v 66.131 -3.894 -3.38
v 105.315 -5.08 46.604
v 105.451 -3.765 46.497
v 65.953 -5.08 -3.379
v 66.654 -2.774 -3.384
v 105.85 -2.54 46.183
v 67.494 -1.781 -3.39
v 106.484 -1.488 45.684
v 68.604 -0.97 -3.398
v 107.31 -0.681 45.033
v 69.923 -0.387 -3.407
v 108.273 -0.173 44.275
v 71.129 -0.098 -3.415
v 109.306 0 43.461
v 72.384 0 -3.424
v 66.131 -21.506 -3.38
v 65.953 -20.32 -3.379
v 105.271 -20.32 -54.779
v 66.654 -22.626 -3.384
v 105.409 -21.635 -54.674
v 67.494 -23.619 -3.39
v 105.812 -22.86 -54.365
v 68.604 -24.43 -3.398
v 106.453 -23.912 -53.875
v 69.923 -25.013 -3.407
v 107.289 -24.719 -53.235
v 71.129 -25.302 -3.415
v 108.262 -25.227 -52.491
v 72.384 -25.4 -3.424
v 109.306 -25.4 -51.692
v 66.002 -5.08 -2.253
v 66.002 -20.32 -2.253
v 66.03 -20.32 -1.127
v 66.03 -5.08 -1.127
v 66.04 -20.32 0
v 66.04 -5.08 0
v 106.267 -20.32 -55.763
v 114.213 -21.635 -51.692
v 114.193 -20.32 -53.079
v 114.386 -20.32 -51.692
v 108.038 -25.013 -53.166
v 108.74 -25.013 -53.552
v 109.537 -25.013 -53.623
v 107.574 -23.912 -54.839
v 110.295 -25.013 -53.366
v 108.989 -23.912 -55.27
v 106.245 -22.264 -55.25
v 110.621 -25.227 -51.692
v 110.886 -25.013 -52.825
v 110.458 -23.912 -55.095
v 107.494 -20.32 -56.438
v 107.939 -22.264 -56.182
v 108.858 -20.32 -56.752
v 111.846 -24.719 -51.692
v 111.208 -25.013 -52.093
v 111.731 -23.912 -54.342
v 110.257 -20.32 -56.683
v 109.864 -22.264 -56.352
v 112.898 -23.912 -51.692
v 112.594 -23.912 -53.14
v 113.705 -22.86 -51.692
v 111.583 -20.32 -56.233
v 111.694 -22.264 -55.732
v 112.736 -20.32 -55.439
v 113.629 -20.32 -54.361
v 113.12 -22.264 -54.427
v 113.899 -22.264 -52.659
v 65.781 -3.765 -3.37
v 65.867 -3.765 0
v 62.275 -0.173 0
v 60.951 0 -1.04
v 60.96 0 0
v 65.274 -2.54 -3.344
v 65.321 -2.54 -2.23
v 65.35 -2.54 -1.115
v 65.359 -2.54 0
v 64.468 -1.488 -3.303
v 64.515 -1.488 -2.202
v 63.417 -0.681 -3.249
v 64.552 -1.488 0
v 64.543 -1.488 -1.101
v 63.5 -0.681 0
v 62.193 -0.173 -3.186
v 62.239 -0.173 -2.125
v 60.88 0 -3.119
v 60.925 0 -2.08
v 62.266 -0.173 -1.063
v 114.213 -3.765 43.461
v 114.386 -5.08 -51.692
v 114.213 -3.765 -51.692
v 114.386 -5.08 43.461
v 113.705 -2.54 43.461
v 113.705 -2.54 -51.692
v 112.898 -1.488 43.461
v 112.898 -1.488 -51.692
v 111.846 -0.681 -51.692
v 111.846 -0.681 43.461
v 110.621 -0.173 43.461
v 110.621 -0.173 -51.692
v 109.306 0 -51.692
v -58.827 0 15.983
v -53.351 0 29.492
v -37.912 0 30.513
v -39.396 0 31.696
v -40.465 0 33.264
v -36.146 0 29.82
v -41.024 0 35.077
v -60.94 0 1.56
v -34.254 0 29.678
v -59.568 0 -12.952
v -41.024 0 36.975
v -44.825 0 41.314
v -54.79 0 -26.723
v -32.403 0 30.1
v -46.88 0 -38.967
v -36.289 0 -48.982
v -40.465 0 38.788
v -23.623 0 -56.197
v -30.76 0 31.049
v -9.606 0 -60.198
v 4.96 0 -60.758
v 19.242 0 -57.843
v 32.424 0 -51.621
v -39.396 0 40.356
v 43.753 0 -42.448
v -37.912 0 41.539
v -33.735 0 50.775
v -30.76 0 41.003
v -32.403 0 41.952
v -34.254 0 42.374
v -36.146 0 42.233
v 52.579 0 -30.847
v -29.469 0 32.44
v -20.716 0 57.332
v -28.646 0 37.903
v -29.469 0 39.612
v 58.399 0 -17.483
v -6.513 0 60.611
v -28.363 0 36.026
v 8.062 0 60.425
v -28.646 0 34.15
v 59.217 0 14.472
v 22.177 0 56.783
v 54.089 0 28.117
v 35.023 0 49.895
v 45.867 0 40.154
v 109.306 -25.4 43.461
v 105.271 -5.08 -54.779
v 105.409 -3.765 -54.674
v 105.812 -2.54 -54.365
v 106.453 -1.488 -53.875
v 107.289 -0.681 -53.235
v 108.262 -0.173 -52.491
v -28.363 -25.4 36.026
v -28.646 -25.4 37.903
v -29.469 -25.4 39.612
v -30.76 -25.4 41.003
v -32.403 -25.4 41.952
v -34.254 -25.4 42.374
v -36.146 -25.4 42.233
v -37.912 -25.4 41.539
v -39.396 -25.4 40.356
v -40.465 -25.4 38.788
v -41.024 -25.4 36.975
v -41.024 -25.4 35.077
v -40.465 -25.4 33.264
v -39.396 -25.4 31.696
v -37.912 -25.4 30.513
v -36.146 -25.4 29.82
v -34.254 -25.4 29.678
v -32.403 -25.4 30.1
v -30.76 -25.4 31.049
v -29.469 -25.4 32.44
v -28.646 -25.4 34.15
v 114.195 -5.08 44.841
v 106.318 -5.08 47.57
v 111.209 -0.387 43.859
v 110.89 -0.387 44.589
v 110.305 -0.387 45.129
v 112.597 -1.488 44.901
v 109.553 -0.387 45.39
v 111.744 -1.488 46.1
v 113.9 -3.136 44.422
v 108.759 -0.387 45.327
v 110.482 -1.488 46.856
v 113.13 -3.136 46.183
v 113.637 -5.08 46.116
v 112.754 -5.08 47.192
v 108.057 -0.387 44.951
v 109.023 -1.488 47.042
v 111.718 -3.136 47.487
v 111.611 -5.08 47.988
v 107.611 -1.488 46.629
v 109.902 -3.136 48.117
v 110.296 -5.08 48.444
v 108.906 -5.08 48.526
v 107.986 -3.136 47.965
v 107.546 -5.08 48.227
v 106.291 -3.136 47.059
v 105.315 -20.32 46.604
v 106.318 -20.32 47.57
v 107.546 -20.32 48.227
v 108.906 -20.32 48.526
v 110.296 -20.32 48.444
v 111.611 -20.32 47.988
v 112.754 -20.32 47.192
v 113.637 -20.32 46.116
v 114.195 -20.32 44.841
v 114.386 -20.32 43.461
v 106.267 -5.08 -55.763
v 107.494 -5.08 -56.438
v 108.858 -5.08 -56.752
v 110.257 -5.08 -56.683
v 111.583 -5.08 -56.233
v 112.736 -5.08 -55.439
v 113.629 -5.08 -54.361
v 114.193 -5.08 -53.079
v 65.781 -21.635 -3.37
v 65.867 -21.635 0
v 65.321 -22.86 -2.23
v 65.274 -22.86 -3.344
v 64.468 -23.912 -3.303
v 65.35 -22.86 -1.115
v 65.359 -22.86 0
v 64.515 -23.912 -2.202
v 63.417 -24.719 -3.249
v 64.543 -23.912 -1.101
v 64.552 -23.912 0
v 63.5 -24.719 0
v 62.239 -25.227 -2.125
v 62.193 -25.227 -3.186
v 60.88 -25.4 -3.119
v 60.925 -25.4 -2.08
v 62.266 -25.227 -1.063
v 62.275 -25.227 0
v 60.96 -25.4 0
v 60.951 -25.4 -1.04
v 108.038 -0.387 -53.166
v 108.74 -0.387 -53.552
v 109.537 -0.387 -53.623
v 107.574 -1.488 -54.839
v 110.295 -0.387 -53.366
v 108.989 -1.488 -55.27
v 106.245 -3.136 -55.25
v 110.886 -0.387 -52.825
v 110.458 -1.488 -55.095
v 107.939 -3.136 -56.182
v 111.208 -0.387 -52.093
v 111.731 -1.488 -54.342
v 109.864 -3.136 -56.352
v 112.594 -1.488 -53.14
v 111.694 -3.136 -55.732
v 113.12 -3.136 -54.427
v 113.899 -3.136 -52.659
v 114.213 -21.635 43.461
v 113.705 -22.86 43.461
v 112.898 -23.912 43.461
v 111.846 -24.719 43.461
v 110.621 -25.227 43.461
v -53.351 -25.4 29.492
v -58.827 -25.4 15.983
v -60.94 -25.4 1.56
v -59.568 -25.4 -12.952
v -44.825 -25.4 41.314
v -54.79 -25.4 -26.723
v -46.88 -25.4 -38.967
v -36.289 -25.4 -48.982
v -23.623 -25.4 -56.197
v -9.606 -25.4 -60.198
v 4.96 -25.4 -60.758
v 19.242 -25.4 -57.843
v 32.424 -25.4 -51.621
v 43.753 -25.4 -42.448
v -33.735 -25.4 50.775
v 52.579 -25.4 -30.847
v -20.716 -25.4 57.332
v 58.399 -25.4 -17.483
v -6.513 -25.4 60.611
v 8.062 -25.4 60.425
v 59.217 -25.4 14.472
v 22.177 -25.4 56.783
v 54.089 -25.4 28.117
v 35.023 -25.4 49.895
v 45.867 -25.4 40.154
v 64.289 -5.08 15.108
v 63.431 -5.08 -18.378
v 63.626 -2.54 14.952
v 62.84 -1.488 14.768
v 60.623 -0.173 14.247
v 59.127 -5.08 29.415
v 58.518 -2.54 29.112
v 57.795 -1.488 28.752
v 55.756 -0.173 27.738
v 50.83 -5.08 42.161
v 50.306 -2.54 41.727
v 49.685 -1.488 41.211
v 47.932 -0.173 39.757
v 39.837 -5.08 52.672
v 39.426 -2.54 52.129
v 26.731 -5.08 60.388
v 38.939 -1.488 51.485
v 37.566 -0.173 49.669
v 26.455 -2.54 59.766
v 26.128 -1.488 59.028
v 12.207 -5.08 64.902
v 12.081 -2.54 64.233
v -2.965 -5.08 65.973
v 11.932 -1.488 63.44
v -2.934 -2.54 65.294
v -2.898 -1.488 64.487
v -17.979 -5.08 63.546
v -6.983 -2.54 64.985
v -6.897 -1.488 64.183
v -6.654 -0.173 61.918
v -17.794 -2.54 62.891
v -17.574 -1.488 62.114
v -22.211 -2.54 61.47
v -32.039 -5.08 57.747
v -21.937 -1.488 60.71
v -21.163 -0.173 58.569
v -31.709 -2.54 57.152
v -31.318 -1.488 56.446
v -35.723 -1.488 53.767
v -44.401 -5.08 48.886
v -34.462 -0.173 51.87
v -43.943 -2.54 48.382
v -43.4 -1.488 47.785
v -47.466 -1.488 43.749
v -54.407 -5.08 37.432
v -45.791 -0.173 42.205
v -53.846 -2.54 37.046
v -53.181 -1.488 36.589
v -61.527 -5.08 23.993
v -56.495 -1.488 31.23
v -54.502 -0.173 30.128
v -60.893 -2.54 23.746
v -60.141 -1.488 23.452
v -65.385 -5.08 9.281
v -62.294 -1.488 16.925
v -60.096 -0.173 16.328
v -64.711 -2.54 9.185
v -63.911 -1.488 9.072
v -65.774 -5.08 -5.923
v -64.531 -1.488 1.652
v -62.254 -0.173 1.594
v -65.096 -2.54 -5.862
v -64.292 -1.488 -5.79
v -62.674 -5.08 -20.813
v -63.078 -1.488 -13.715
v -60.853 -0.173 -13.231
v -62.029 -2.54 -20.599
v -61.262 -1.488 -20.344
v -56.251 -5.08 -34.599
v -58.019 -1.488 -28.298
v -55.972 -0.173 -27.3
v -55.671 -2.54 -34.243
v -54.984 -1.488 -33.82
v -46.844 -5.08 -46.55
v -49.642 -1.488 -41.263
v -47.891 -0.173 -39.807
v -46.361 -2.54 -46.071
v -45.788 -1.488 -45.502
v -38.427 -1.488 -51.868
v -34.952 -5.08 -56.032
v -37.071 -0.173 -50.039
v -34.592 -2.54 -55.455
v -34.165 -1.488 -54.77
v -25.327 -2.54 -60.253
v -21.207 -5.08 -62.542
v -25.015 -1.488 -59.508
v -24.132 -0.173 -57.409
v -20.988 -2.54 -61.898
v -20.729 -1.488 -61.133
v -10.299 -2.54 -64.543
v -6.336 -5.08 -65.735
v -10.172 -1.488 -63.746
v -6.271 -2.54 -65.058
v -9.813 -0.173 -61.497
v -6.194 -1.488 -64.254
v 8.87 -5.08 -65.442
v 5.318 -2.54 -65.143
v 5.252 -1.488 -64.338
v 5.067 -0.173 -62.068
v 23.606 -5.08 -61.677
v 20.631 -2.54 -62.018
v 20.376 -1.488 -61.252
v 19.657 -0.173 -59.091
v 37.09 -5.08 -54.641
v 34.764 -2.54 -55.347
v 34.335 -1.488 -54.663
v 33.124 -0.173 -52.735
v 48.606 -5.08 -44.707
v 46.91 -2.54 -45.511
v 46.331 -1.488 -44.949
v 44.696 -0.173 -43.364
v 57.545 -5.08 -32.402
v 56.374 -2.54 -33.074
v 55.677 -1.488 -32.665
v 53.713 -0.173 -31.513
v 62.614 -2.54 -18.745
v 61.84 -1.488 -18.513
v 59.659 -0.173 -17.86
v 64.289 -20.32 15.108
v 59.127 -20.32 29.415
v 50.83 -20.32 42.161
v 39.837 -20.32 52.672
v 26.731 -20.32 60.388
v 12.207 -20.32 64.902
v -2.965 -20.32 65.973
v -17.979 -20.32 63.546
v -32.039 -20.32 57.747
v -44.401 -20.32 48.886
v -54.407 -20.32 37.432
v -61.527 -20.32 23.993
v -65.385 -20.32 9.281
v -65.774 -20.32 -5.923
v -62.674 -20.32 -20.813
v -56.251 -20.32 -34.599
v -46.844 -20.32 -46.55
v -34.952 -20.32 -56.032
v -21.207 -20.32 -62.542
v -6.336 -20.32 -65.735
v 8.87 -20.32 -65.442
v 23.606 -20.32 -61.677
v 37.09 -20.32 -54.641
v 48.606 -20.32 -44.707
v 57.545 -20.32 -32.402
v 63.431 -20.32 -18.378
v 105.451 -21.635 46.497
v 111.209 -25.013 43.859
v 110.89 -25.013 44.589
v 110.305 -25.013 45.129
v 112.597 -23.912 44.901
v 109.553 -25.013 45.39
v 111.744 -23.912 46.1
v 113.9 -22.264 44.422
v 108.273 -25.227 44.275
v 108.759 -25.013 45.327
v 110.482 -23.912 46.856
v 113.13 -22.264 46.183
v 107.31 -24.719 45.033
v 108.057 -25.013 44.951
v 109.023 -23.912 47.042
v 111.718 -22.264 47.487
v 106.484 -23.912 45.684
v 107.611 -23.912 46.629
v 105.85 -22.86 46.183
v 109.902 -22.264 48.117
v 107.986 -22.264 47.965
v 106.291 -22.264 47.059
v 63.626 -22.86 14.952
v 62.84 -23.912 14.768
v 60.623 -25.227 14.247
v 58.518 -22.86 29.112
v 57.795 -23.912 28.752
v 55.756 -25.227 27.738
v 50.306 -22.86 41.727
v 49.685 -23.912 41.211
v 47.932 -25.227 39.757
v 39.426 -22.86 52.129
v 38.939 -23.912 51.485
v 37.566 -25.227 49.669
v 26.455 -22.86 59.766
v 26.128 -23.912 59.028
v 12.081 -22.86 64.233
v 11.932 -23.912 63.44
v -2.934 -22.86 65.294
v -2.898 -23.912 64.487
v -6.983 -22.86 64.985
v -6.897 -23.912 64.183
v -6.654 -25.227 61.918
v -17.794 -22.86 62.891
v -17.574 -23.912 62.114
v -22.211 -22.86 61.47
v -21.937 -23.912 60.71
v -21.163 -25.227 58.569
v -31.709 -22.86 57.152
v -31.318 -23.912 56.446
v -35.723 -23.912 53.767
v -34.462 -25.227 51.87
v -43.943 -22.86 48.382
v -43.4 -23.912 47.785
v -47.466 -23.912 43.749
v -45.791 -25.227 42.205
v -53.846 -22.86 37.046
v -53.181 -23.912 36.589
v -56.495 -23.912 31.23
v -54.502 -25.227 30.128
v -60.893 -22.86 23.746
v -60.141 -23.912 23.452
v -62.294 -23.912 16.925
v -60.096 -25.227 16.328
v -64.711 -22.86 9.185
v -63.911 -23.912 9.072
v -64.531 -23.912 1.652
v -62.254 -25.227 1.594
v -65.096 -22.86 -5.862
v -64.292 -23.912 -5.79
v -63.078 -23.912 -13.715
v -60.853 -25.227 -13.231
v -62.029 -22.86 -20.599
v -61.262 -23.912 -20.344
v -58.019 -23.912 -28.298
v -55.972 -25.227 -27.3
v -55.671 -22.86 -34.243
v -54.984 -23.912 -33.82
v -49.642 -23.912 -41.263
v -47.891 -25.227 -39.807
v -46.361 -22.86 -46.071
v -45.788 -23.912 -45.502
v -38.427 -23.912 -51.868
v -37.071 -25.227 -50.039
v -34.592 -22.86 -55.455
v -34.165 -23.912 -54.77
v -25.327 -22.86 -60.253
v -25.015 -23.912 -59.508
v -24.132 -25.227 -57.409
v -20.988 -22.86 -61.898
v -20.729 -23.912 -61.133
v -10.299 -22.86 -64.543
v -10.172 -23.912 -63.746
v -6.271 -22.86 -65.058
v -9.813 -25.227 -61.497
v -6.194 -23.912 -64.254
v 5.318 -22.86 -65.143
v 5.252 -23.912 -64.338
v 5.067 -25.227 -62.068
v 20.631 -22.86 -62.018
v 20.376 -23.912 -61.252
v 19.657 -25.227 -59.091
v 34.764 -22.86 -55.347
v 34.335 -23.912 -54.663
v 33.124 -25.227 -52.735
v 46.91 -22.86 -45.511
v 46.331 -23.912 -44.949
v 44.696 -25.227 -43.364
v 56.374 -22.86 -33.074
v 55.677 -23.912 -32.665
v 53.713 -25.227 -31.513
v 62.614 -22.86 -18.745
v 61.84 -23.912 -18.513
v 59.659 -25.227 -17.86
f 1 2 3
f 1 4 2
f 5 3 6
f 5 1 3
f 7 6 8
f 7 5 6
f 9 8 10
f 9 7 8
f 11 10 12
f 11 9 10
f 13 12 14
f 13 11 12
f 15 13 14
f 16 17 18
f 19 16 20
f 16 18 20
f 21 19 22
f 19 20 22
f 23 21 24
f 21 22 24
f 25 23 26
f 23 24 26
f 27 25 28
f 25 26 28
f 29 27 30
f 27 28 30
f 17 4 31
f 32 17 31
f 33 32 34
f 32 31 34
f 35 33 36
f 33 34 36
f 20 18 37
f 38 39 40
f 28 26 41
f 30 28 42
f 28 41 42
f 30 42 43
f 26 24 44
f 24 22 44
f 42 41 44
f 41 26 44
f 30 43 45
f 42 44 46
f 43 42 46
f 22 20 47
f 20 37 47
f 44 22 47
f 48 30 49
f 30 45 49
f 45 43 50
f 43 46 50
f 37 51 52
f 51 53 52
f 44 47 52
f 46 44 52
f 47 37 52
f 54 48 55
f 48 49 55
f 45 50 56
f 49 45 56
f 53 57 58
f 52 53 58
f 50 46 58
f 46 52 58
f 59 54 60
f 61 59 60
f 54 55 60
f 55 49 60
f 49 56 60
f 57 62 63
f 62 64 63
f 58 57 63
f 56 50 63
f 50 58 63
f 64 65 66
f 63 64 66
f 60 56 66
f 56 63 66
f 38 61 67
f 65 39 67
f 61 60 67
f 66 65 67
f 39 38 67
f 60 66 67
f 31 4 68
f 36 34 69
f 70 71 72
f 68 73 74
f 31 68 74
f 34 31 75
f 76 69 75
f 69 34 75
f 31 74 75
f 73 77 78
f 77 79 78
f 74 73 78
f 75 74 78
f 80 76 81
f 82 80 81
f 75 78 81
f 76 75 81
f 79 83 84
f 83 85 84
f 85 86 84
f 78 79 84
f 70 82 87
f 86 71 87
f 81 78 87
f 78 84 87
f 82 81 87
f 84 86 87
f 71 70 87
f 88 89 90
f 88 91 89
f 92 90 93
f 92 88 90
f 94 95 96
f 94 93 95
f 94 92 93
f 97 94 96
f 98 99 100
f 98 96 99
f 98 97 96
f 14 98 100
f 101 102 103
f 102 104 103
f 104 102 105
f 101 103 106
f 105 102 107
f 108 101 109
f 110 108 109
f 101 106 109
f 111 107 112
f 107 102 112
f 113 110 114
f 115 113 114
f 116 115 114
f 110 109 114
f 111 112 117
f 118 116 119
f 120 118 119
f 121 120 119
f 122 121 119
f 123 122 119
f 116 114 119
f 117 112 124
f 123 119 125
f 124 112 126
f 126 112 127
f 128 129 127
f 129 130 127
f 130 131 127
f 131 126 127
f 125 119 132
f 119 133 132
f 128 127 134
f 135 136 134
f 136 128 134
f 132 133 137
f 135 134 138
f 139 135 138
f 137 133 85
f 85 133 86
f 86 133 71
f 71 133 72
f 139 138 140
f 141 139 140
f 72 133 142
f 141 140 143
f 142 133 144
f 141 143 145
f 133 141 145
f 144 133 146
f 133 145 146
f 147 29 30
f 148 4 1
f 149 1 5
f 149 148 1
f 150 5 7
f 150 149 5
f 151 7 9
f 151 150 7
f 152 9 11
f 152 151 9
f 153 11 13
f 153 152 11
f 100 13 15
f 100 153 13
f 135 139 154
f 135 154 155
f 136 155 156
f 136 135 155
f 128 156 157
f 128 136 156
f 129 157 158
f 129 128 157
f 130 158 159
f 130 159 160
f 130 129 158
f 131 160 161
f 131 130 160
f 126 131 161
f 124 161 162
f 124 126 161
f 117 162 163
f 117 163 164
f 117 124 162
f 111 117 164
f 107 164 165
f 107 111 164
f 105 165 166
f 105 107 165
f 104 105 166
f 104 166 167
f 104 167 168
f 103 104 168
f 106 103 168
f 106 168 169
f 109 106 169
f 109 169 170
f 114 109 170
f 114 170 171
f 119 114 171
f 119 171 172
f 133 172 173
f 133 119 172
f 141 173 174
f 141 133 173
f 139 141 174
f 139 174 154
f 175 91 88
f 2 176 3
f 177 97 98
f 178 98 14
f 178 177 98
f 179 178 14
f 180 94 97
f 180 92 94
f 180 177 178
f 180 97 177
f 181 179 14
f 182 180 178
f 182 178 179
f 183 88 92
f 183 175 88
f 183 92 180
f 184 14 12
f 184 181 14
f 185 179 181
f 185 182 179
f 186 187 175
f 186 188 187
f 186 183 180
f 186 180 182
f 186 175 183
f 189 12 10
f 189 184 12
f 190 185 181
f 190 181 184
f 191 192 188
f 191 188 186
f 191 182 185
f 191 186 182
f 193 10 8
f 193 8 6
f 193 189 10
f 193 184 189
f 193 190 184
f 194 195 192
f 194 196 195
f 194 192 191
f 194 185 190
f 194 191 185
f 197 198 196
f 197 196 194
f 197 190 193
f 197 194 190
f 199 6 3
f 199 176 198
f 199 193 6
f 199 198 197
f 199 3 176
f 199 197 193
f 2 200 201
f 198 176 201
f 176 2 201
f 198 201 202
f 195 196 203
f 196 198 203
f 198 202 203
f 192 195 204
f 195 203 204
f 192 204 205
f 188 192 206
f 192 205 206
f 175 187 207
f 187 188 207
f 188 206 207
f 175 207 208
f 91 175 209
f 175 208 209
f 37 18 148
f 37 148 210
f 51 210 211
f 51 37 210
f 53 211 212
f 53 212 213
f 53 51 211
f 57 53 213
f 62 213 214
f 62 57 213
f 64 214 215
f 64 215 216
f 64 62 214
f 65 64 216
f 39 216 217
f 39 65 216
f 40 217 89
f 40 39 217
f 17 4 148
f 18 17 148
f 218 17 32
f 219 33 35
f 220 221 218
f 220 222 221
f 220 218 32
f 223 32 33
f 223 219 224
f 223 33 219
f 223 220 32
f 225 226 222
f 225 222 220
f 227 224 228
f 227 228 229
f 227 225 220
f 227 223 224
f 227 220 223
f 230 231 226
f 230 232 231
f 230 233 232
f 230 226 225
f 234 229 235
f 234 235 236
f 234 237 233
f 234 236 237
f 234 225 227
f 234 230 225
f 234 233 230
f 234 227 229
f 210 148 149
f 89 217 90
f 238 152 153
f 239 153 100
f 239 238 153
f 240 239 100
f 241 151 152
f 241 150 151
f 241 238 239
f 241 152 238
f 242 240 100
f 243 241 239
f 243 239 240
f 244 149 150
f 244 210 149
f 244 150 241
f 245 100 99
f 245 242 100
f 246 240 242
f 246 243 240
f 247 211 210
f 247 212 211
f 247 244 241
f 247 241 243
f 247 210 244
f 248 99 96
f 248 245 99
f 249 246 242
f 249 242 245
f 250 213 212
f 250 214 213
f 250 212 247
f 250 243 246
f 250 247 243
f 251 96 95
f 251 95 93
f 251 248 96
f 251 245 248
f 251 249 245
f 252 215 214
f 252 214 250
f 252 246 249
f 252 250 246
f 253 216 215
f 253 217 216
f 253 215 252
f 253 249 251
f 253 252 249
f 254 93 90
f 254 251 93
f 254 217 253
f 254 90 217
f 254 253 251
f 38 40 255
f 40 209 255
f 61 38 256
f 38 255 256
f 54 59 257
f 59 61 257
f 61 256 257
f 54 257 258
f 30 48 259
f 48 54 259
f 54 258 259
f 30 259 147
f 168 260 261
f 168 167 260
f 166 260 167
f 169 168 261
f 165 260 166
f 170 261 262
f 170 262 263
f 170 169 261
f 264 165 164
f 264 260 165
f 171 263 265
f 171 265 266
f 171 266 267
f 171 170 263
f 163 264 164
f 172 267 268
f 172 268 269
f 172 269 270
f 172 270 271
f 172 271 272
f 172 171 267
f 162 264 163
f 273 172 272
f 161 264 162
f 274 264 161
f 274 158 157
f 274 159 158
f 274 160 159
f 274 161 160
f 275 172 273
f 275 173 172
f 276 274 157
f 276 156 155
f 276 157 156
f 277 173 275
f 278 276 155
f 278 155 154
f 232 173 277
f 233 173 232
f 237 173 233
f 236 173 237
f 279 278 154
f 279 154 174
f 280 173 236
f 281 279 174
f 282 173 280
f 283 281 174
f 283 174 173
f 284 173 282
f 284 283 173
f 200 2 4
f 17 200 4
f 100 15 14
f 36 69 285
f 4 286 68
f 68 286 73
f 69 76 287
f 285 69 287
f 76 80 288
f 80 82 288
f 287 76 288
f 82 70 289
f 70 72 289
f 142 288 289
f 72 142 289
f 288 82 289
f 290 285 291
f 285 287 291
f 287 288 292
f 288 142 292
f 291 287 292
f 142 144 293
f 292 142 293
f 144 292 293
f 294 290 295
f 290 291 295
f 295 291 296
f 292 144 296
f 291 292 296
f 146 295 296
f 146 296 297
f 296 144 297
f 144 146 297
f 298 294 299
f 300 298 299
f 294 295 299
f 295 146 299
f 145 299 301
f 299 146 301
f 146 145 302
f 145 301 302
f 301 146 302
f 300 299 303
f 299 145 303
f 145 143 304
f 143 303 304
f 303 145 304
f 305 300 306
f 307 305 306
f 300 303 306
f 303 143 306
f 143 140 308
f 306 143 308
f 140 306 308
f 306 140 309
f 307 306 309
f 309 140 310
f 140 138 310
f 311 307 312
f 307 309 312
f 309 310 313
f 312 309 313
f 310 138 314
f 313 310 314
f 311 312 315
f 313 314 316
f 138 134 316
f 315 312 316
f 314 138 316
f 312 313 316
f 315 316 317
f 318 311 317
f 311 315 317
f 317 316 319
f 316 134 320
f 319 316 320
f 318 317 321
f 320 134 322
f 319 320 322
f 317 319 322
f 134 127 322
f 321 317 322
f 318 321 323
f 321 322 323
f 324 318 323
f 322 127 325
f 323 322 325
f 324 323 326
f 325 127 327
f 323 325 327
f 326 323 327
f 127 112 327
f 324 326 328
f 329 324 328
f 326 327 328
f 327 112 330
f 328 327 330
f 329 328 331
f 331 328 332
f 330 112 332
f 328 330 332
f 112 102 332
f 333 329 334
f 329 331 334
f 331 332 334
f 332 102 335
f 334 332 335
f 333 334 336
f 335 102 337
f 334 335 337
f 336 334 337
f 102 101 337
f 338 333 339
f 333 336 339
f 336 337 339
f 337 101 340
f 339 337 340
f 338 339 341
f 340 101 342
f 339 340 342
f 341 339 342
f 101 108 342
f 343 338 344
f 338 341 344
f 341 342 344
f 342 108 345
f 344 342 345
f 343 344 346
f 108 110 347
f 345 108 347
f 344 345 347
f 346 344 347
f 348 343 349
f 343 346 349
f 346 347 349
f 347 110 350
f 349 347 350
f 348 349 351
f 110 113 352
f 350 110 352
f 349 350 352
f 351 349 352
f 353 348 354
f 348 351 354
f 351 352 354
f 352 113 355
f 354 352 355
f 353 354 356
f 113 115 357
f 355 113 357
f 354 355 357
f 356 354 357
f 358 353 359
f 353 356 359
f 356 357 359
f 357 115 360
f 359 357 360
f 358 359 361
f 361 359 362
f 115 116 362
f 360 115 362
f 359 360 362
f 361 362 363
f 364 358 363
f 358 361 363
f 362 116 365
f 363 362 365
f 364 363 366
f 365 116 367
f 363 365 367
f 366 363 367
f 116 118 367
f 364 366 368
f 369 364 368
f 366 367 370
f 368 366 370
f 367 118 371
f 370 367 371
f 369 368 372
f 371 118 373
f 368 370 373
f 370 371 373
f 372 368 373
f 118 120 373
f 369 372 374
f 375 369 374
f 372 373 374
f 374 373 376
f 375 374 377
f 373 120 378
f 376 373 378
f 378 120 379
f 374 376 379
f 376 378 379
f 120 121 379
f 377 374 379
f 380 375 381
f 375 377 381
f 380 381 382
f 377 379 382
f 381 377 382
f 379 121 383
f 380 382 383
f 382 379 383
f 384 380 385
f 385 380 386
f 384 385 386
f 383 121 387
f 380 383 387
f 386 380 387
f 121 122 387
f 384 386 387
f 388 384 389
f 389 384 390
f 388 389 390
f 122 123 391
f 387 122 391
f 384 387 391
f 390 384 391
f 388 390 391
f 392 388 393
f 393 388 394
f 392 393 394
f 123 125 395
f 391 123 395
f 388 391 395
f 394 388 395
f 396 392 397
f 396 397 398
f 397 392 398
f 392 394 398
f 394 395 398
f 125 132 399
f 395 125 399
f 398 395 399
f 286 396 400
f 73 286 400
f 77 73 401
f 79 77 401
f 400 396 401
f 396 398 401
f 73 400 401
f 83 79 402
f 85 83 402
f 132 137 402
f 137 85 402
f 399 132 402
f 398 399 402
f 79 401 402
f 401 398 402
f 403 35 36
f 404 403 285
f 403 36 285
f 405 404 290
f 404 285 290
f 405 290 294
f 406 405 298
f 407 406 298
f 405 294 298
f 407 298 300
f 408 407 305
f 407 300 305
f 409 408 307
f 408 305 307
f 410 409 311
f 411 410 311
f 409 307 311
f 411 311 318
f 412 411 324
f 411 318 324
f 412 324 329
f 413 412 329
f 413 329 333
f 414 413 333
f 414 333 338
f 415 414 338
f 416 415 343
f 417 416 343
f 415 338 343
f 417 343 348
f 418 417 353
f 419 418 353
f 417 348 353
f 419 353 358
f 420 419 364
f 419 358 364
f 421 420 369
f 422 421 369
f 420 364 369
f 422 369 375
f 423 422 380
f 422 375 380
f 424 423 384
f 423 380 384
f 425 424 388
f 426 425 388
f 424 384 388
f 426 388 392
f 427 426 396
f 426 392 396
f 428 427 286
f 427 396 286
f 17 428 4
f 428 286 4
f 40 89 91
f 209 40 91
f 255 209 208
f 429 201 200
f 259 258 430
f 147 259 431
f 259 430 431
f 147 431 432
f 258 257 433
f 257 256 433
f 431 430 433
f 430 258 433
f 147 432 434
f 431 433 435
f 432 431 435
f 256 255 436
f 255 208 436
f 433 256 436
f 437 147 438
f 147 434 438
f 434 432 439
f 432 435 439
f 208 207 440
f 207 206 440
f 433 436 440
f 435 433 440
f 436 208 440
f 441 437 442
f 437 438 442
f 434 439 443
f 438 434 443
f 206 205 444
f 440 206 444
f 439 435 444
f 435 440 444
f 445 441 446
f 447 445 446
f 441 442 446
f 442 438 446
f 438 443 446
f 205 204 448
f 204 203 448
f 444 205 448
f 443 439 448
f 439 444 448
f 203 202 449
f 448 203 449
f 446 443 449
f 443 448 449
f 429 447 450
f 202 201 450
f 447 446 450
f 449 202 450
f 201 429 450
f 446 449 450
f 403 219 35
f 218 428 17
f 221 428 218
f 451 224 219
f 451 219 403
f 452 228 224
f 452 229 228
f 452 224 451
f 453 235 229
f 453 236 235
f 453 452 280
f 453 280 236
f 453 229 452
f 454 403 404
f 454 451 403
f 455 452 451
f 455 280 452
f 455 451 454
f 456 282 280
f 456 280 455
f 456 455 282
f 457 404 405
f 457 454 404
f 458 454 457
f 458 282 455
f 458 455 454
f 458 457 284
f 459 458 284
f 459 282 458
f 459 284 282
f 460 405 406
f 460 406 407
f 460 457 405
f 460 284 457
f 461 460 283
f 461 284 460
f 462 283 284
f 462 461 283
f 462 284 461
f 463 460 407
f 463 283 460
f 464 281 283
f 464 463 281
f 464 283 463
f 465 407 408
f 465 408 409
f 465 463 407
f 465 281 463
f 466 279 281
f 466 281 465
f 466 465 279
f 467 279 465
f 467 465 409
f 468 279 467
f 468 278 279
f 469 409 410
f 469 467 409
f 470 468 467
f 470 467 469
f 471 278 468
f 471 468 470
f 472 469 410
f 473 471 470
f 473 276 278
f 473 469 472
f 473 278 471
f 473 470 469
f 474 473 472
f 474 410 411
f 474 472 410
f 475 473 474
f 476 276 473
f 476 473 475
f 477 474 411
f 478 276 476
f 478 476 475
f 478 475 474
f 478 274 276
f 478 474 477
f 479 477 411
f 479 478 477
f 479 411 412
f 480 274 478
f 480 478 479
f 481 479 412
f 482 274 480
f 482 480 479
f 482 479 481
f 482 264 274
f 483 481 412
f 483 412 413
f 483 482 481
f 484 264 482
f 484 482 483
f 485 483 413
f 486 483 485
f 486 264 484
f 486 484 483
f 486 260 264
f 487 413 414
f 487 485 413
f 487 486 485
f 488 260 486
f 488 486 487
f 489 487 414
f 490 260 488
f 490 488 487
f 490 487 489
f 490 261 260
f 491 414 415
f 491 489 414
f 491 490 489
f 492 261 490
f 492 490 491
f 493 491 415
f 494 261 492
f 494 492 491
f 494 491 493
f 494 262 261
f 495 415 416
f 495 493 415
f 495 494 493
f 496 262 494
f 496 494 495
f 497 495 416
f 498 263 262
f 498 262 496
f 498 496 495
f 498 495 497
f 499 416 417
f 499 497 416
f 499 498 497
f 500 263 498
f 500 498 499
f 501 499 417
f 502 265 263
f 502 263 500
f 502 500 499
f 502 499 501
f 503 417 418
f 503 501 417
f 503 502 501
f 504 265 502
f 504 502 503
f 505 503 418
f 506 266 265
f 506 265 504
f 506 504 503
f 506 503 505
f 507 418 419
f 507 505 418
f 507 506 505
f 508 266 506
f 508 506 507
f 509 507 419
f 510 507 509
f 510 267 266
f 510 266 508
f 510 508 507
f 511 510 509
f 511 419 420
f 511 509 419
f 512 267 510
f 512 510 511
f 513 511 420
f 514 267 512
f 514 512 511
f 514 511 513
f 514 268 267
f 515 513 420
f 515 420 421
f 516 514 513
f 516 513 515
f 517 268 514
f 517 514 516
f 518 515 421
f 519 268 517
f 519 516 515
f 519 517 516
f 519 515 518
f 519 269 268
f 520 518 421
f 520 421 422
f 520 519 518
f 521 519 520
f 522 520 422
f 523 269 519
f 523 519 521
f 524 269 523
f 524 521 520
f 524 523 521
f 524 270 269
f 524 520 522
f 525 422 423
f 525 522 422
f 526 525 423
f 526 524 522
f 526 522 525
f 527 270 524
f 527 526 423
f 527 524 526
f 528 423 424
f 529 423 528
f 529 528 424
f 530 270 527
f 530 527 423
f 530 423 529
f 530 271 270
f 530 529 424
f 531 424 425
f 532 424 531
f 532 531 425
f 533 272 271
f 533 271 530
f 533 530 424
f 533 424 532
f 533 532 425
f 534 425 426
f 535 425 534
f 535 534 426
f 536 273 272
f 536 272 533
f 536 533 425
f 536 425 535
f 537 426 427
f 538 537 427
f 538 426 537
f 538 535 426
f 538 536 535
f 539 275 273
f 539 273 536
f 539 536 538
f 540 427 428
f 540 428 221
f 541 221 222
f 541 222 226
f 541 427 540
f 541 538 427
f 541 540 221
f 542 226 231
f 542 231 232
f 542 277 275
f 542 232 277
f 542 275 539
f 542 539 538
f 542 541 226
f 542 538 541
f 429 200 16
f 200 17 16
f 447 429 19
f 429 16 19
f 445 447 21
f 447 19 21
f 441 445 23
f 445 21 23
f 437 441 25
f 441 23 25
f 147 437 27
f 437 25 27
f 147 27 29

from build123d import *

# Parameters (mm, degrees)
F1_DEPTH = 25.4
F2_R     = 5.08
F2_2_R   = 5.08
F3_R     = 6.3660759479
F4_DEPTH = 25.4


with BuildPart() as f1:
    # F0 (on Front) → F1 (new body)
    with BuildSketch(Plane.XZ):
        with BuildLine():
            ThreePointArc((65.9534972126, -3.3790243298), (66.0183707612, -1.6900656906), (66.04, 0))
            ThreePointArc((66.04, 0), (-66.0183707612, 1.6900656906), (65.9534972126, -3.3790243298))
        make_face()
    extrude(amount=F1_DEPTH)

    # F2
    f2_edges = [f1.edges().sort_by_distance(p)[0] for p in [
        (-65.953497, -25.4, 3.379024),
        (-65.953497, 0, 3.379024),
    ]]
    fillet(f2_edges, radius=F2_R)

    # F3 (on Front) → F4 (cut)
    with BuildSketch(Plane.XZ):
        with Locations((-34.7292758524, 36.0262021422)):
            Circle(F3_R)
    extrude(amount=F4_DEPTH, mode=Mode.SUBTRACT)


with BuildPart() as f1b:
    # F0 (on Front) → F1, piece 2 (new body)
    with BuildSketch(Plane.XZ):
        Polygon((114.3860071898, 58.1232085824), (65.9534972126, -3.3790243298), (114.3860071898, -66.694535315), align=None)
    extrude(amount=F1_DEPTH)

    # F2#2
    f2_2_edges = [f1b.edges().sort_by_distance(p)[0] for p in [
        (90.169752, -25.4, 27.372092),
        (114.386007, -12.7, 58.123209),
        (114.386007, 0, -4.285663),
        (114.386007, -12.7, -66.694535),
        (90.169752, -25.4, -35.03678),
        (114.386007, -25.4, -4.285663),
        (90.169752, 0, -35.03678),
        (90.169752, 0, 27.372092),
    ]]
    fillet(f2_2_edges, radius=F2_2_R)


solid = Compound([f1.part, f1b.part])
